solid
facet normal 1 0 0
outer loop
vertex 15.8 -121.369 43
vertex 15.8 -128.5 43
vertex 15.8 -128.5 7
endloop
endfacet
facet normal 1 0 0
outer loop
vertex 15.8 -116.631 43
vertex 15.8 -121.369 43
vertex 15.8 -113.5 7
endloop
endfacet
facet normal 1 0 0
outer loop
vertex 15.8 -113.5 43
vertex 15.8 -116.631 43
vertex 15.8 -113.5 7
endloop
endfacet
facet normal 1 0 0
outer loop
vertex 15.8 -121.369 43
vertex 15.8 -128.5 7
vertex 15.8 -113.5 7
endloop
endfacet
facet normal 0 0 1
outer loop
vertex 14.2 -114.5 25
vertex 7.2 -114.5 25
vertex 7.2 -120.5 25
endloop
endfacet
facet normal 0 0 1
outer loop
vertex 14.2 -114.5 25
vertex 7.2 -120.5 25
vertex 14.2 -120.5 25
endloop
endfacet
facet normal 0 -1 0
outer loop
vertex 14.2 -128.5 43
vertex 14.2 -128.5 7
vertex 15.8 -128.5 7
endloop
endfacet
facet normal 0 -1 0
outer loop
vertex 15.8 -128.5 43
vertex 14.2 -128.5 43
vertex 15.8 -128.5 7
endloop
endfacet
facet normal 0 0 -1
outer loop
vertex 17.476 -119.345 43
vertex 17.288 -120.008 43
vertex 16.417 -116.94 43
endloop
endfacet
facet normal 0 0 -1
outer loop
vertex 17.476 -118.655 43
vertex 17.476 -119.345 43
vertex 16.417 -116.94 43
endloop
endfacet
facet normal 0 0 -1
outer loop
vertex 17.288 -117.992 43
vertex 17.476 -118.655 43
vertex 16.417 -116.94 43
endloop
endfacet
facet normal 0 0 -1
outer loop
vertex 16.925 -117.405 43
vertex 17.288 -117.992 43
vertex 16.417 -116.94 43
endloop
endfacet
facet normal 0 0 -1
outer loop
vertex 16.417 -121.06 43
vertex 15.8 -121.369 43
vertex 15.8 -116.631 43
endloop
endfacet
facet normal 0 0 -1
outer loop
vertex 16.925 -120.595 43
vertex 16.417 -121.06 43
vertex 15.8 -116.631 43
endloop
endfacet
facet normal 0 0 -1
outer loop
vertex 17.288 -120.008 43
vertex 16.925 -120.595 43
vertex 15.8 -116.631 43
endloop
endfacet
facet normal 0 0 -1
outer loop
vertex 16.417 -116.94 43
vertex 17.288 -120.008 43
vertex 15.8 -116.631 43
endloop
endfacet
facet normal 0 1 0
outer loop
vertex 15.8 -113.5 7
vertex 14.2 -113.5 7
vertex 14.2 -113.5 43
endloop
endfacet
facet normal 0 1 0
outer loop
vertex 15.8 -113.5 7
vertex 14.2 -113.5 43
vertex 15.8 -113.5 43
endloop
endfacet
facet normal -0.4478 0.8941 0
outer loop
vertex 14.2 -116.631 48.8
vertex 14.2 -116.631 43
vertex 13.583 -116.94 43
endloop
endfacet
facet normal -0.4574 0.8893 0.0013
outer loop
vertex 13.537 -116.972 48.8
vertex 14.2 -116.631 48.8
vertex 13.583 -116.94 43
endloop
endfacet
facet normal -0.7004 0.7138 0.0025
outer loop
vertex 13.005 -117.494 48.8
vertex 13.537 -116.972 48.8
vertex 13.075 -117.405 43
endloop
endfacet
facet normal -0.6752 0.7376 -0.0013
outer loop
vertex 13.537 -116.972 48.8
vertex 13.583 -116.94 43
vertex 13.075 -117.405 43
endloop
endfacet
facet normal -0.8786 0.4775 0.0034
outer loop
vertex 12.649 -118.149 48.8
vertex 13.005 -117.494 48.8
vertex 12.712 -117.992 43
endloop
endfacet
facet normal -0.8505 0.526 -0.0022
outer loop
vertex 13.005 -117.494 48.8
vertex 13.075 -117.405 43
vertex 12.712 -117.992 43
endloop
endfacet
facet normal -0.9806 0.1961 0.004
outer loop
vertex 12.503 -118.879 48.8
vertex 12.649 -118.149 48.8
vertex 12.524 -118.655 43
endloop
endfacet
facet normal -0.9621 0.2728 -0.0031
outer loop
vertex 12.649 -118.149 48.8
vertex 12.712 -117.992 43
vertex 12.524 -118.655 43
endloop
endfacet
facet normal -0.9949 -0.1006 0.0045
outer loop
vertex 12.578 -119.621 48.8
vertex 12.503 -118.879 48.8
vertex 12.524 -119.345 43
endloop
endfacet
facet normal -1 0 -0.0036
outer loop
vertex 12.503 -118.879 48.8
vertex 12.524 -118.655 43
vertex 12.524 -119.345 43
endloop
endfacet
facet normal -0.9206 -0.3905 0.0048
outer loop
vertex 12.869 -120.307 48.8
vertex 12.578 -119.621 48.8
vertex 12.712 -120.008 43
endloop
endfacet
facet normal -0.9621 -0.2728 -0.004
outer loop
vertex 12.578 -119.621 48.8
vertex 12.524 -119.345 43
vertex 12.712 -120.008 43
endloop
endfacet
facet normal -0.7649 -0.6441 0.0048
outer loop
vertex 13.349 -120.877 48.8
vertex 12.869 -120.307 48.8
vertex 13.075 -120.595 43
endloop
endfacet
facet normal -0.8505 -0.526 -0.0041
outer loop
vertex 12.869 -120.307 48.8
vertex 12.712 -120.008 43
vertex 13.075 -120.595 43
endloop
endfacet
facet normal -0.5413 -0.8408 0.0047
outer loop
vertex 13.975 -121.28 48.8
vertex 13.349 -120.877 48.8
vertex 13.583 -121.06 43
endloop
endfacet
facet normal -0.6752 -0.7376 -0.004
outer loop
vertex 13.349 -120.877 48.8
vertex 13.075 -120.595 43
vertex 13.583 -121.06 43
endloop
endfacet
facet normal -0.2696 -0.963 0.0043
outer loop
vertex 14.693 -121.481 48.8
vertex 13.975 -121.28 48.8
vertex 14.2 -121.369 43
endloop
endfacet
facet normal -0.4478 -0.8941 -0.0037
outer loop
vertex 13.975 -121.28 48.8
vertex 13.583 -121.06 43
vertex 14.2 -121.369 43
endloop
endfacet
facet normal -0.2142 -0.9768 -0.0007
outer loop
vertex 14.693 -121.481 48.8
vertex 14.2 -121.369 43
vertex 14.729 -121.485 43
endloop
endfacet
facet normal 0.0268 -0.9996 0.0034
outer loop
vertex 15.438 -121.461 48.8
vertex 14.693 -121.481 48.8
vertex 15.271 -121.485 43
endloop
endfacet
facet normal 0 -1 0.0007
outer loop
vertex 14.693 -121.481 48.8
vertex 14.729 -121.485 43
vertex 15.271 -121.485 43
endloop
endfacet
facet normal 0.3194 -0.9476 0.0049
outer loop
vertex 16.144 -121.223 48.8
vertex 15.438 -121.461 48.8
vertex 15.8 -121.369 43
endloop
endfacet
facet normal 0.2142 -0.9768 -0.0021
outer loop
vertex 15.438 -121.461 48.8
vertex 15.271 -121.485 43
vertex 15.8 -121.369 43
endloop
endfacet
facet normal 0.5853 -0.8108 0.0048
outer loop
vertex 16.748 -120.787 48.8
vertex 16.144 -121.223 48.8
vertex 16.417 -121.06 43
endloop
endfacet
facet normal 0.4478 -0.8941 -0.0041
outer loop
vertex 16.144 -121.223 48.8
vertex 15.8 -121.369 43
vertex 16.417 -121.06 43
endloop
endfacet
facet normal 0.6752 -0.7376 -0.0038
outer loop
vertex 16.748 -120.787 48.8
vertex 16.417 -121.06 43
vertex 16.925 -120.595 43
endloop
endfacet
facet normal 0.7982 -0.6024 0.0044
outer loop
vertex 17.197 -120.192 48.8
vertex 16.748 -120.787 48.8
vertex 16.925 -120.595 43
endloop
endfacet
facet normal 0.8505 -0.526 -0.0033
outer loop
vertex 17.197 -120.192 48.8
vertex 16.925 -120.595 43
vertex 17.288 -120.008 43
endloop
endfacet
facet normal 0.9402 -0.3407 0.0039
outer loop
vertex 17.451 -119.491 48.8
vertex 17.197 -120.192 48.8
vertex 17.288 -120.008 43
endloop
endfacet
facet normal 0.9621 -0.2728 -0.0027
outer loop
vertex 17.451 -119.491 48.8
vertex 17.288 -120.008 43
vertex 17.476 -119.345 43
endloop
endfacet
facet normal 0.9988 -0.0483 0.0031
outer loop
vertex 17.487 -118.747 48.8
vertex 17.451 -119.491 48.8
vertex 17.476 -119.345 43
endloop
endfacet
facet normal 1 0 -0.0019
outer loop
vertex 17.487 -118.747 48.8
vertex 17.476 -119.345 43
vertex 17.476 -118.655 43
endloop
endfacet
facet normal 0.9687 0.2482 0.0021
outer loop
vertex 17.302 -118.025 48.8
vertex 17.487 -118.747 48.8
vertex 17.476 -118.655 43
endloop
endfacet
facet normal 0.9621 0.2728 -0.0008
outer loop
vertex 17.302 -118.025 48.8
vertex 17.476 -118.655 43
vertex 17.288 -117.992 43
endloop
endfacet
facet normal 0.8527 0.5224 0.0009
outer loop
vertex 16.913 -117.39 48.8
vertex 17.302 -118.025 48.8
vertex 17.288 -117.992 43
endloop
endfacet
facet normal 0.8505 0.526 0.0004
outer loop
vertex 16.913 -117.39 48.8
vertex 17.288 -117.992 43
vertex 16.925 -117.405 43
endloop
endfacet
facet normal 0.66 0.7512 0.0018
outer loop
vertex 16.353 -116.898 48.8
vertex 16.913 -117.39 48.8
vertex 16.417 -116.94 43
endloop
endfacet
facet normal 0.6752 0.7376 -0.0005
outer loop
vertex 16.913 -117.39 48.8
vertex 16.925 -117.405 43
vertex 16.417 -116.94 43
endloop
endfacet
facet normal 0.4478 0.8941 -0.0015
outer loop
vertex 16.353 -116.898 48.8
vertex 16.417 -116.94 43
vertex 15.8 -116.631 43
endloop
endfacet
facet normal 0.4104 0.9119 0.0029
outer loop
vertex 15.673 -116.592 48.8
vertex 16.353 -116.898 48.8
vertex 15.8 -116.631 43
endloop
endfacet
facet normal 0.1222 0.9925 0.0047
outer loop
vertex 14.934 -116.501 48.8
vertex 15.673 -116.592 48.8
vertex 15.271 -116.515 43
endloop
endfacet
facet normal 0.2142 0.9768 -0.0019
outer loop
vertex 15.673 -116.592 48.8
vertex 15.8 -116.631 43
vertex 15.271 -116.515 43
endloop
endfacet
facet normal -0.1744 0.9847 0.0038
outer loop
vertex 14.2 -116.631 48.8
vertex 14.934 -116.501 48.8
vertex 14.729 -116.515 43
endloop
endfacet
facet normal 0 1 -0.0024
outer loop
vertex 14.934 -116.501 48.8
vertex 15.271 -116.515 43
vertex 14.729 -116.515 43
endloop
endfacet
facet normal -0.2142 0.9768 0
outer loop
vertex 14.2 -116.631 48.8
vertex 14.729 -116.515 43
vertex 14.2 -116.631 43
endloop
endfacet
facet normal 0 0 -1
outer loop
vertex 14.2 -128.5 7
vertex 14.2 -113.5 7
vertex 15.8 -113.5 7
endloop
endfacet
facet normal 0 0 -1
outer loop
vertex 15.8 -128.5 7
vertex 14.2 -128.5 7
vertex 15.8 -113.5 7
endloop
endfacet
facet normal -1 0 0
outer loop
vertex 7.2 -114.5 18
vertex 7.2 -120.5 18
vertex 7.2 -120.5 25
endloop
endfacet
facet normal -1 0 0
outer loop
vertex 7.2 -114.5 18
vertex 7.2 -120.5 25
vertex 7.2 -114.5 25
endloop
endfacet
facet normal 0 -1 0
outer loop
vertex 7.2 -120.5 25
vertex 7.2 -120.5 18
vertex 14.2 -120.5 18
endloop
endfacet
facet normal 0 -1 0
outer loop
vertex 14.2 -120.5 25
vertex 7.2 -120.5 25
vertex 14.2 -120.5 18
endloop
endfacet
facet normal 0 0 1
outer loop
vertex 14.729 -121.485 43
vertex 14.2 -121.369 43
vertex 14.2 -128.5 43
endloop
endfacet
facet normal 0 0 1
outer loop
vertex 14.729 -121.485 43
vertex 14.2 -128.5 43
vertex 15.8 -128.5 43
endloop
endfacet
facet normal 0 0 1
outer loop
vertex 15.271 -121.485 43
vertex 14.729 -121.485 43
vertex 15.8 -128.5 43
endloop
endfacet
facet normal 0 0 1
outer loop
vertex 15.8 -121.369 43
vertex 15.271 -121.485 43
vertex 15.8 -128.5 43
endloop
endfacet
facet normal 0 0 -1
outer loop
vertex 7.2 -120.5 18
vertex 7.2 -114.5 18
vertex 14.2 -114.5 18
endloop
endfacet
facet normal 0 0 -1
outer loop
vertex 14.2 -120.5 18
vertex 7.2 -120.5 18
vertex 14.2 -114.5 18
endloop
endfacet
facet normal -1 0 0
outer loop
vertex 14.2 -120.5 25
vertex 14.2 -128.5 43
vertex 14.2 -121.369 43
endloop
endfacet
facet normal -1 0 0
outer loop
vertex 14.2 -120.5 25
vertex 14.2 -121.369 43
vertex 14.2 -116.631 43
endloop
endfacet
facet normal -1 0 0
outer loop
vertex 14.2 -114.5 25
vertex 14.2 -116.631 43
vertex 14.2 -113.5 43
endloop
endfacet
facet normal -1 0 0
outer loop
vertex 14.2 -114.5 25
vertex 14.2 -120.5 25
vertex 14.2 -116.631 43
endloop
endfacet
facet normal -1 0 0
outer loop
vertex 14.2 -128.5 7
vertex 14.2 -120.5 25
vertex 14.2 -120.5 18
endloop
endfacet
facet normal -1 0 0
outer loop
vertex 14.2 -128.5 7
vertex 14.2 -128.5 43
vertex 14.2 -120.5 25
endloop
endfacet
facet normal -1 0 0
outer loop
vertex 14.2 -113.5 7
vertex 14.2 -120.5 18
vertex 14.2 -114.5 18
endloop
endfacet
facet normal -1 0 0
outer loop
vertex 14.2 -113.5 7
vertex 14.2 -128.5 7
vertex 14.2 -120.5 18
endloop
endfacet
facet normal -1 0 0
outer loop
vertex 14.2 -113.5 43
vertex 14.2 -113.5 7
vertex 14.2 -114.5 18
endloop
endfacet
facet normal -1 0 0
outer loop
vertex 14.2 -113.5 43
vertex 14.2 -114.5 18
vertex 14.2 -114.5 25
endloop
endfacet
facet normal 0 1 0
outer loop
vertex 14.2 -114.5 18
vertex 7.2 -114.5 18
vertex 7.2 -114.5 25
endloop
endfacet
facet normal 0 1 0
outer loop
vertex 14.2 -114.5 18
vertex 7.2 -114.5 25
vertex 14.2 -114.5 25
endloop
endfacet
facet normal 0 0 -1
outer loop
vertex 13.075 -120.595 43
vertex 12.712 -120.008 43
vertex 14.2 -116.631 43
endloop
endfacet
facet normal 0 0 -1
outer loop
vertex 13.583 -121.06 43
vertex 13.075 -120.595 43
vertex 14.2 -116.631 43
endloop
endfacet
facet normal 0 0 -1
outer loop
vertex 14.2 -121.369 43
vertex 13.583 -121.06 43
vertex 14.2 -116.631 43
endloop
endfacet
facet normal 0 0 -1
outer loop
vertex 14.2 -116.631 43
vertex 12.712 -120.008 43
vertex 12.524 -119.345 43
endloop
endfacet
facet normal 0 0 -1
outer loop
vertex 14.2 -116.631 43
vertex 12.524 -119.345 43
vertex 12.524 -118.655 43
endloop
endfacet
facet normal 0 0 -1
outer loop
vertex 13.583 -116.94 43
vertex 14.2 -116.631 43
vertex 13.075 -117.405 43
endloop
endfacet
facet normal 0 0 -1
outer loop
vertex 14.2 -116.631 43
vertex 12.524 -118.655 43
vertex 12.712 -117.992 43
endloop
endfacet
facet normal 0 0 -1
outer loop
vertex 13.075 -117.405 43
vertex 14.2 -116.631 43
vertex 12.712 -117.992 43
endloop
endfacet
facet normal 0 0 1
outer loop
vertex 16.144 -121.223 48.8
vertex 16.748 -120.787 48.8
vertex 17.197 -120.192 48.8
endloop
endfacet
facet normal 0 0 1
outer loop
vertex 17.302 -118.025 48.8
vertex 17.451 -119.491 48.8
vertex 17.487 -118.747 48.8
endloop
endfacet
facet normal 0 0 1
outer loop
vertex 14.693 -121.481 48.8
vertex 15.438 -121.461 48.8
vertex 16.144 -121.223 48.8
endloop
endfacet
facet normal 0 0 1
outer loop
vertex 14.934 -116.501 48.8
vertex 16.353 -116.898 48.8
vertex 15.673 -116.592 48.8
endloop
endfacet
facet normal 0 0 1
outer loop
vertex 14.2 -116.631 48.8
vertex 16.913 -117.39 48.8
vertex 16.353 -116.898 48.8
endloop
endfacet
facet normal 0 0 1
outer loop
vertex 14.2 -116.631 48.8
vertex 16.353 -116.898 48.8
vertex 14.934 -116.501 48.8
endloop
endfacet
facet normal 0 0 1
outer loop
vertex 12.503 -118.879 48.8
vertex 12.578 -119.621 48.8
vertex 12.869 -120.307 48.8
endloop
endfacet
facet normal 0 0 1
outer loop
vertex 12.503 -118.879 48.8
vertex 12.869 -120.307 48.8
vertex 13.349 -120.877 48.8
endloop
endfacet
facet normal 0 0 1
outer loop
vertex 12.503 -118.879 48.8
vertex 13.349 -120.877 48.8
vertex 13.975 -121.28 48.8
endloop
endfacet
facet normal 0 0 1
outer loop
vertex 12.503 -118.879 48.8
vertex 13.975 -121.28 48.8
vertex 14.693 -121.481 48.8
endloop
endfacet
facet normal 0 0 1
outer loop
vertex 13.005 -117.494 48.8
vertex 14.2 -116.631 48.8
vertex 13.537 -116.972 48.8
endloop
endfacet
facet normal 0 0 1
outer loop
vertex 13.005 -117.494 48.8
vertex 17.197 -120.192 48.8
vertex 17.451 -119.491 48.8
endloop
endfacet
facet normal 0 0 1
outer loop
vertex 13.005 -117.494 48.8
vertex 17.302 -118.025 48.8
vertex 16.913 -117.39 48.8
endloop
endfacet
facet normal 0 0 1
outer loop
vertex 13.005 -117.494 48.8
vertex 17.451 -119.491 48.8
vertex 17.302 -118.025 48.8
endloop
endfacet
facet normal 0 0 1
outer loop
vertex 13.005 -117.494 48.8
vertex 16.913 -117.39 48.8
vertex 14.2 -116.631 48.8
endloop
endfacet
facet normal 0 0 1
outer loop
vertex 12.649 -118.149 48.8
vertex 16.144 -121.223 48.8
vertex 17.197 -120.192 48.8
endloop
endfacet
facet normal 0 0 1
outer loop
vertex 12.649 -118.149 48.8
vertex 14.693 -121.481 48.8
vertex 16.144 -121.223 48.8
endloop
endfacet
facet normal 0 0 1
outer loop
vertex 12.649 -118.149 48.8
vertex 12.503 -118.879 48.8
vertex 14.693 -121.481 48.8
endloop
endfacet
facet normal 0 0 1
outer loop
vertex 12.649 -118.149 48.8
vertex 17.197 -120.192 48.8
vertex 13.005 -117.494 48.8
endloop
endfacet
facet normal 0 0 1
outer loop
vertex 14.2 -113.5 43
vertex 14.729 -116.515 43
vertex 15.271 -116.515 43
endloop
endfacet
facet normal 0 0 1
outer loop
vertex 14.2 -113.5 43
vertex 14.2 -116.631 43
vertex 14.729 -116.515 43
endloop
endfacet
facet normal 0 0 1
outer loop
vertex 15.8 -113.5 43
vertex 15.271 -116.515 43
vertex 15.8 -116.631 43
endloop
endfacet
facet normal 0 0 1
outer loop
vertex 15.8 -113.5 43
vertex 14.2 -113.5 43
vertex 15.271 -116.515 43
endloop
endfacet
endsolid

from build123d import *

# Parameters (mm, degrees)
SKETCH1_W           = 1.6
SKETCH1_H           = 15
BOSS_EXTRUDE1_DEPTH = 36
SKETCH2_R           = 2.5
BOSS_EXTRUDE2_DEPTH = 5.8
SKETCH3_W           = 7
SKETCH3_H           = 6
BOSS_EXTRUDE3_DEPTH = 7


with BuildPart() as part:
    # Sketch1 → Boss-Extrude1 (new body)
    with BuildSketch(Plane.XY.offset(7)):
        with Locations((15, -121)):
            Rectangle(SKETCH1_W, SKETCH1_H)
    extrude(amount=BOSS_EXTRUDE1_DEPTH)

    # Sketch2 → Boss-Extrude2 (add)
    with BuildSketch(Plane.XY.offset(43)):
        with Locations(Location((15, -119, 0), (0, 0, 108.662924885))):
            Circle(SKETCH2_R)
    extrude(amount=BOSS_EXTRUDE2_DEPTH)

    # Sketch3 → Boss-Extrude3 (add)
    with BuildSketch(Plane.XY.offset(18)):
        with Locations((10.7, -117.5)):
            Rectangle(SKETCH3_W, SKETCH3_H)
    extrude(amount=BOSS_EXTRUDE3_DEPTH)


solid = part.part
